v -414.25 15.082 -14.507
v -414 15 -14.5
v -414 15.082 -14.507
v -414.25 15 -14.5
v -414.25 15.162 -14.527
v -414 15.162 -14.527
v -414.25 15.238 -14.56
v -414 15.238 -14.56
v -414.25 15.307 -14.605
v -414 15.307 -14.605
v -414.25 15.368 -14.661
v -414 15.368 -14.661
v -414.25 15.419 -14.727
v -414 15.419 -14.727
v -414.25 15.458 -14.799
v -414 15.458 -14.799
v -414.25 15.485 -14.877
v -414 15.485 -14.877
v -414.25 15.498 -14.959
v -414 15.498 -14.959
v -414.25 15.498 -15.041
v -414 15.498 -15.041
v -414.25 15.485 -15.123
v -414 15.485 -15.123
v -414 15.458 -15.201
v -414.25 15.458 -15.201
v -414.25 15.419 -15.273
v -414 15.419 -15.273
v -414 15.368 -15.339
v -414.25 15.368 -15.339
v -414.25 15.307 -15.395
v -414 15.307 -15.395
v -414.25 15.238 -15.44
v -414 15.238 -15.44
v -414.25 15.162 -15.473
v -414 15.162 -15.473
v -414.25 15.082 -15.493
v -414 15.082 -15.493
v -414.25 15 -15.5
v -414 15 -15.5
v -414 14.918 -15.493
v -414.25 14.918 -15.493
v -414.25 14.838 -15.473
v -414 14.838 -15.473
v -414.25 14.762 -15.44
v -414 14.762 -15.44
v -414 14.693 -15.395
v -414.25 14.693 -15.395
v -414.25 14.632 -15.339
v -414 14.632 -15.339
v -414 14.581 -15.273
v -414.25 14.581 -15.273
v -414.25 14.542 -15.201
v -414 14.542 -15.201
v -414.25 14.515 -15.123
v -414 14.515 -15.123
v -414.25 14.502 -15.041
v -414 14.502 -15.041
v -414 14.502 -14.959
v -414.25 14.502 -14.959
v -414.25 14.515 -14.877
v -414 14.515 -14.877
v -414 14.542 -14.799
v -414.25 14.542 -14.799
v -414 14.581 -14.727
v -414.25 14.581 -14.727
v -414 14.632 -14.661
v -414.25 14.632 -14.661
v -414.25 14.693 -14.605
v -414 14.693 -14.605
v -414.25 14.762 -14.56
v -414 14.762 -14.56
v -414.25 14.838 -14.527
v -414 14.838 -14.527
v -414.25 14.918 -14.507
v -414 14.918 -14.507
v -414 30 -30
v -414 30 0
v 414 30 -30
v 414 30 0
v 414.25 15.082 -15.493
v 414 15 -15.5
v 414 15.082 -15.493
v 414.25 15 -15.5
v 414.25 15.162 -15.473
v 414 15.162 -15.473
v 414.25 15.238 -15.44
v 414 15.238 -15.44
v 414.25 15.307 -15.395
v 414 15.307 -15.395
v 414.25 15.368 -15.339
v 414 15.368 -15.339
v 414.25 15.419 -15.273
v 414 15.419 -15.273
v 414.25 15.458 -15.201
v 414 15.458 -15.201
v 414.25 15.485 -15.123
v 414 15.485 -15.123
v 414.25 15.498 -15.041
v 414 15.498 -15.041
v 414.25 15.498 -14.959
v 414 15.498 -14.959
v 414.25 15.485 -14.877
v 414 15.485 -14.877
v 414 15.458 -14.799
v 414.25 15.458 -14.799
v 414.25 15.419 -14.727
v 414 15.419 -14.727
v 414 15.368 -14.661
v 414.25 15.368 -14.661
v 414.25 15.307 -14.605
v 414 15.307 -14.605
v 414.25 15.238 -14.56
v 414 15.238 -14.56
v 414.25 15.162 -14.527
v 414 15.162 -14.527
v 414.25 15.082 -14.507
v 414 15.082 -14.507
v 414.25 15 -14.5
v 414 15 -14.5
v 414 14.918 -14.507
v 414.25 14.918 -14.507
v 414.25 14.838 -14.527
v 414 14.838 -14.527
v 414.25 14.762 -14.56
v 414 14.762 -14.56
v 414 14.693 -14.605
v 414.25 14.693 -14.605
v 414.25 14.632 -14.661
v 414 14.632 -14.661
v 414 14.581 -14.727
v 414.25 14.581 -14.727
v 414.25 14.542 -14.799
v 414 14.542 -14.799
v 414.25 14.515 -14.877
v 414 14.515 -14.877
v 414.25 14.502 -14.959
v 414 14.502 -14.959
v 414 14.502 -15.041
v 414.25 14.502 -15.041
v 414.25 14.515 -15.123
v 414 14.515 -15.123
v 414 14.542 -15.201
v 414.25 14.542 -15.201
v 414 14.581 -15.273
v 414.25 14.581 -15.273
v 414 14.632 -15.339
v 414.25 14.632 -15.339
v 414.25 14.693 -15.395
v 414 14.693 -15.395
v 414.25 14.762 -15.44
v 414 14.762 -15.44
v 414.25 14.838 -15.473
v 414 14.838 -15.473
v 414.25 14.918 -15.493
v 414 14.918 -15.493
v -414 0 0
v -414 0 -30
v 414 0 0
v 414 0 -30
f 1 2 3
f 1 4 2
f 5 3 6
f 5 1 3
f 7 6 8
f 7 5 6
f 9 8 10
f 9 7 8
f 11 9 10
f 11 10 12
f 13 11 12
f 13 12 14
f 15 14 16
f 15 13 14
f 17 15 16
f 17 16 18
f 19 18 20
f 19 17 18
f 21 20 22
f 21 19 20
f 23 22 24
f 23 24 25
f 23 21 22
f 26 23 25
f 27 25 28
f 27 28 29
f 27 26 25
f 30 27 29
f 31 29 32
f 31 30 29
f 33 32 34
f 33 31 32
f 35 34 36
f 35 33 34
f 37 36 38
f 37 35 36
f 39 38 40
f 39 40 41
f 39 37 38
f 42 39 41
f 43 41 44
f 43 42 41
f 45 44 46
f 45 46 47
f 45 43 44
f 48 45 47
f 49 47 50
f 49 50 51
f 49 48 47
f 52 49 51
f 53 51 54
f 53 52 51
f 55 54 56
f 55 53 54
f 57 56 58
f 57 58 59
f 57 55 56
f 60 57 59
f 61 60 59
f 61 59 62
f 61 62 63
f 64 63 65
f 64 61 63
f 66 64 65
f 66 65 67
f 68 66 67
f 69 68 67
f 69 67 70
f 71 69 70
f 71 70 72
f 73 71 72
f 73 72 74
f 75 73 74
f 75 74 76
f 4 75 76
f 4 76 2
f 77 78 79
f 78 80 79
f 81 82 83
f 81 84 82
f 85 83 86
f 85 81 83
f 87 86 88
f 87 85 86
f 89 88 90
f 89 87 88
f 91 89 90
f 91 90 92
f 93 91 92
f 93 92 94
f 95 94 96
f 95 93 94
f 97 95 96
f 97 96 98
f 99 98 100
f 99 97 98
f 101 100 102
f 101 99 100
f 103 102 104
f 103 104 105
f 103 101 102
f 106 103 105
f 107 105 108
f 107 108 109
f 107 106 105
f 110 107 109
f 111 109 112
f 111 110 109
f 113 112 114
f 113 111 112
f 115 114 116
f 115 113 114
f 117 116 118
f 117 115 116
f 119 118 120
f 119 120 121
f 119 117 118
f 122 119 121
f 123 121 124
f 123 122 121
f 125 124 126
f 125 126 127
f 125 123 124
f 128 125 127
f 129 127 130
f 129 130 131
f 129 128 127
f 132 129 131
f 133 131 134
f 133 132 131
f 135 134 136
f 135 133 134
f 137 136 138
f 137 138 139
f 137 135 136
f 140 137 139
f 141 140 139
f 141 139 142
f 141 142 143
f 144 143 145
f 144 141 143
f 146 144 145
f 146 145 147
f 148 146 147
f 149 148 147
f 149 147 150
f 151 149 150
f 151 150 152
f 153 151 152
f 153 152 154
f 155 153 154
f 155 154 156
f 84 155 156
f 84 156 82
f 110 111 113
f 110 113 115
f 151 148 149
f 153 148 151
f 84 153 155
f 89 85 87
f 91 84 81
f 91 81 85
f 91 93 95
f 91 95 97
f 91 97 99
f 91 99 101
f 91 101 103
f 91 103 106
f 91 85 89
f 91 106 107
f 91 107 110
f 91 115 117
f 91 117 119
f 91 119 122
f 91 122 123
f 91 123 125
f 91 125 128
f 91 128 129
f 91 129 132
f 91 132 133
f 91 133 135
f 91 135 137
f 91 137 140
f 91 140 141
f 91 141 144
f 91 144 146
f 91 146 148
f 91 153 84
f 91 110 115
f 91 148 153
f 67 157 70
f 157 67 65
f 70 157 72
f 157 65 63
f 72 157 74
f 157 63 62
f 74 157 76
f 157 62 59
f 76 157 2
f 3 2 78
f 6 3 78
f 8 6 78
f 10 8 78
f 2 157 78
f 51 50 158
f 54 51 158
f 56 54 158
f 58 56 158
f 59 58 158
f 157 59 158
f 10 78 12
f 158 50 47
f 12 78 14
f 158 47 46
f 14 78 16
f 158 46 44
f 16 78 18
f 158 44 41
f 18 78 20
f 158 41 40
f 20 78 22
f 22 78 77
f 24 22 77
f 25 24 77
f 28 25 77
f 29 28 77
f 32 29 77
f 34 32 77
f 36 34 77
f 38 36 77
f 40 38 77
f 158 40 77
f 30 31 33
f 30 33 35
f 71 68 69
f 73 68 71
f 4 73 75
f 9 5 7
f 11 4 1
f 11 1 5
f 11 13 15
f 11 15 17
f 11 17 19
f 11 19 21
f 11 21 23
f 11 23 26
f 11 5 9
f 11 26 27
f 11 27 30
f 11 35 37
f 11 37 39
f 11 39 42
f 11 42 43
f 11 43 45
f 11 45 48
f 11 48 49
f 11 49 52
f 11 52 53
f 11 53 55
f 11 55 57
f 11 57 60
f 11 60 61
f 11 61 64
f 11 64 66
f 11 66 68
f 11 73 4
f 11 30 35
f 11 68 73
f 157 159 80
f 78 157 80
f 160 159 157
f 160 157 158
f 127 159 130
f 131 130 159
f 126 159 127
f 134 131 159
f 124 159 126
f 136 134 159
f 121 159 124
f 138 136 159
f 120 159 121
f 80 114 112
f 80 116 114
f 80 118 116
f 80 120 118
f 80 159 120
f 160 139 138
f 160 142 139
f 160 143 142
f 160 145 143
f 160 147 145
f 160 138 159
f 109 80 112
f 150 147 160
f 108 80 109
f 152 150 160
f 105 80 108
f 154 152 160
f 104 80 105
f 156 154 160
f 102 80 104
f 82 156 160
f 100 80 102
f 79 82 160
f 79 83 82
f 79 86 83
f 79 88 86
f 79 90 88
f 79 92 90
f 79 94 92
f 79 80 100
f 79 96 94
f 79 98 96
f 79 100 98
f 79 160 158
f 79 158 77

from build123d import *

# Parameters (mm, degrees)
SKETCH1_W           = 30
SKETCH1_H           = 30
BOSS_EXTRUDE2_DEPTH = 414
SKETCH3_R           = 0.5
BOSS_EXTRUDE3_DEPTH = 0.25
SKETCH4_R           = 0.5
BOSS_EXTRUDE4_DEPTH = 0.25


with BuildPart() as part:
    # Sketch1 → Boss-Extrude2 (new body, symmetric)
    with BuildSketch(Plane(origin=(0, 0, 0), x_dir=(0, 0, -1), z_dir=(1, 0, 0))):
        with Locations((15, 15)):
            Rectangle(SKETCH1_W, SKETCH1_H)
    extrude(amount=BOSS_EXTRUDE2_DEPTH, both=True)

    # Sketch3 → Boss-Extrude3 (add, symmetric)
    with BuildSketch(Plane.ZY.offset(414)):
        with Locations((-15, 15)):
            Circle(SKETCH3_R)
    extrude(amount=BOSS_EXTRUDE3_DEPTH, both=True)

    # Sketch4 → Boss-Extrude4 (add, symmetric)
    with BuildSketch(Plane(origin=(414, 0, 0), x_dir=(0, 0, -1), z_dir=(1, 0, 0))):
        with Locations((15, 15)):
            Circle(SKETCH4_R)
    extrude(amount=BOSS_EXTRUDE4_DEPTH, both=True)


solid = part.part
